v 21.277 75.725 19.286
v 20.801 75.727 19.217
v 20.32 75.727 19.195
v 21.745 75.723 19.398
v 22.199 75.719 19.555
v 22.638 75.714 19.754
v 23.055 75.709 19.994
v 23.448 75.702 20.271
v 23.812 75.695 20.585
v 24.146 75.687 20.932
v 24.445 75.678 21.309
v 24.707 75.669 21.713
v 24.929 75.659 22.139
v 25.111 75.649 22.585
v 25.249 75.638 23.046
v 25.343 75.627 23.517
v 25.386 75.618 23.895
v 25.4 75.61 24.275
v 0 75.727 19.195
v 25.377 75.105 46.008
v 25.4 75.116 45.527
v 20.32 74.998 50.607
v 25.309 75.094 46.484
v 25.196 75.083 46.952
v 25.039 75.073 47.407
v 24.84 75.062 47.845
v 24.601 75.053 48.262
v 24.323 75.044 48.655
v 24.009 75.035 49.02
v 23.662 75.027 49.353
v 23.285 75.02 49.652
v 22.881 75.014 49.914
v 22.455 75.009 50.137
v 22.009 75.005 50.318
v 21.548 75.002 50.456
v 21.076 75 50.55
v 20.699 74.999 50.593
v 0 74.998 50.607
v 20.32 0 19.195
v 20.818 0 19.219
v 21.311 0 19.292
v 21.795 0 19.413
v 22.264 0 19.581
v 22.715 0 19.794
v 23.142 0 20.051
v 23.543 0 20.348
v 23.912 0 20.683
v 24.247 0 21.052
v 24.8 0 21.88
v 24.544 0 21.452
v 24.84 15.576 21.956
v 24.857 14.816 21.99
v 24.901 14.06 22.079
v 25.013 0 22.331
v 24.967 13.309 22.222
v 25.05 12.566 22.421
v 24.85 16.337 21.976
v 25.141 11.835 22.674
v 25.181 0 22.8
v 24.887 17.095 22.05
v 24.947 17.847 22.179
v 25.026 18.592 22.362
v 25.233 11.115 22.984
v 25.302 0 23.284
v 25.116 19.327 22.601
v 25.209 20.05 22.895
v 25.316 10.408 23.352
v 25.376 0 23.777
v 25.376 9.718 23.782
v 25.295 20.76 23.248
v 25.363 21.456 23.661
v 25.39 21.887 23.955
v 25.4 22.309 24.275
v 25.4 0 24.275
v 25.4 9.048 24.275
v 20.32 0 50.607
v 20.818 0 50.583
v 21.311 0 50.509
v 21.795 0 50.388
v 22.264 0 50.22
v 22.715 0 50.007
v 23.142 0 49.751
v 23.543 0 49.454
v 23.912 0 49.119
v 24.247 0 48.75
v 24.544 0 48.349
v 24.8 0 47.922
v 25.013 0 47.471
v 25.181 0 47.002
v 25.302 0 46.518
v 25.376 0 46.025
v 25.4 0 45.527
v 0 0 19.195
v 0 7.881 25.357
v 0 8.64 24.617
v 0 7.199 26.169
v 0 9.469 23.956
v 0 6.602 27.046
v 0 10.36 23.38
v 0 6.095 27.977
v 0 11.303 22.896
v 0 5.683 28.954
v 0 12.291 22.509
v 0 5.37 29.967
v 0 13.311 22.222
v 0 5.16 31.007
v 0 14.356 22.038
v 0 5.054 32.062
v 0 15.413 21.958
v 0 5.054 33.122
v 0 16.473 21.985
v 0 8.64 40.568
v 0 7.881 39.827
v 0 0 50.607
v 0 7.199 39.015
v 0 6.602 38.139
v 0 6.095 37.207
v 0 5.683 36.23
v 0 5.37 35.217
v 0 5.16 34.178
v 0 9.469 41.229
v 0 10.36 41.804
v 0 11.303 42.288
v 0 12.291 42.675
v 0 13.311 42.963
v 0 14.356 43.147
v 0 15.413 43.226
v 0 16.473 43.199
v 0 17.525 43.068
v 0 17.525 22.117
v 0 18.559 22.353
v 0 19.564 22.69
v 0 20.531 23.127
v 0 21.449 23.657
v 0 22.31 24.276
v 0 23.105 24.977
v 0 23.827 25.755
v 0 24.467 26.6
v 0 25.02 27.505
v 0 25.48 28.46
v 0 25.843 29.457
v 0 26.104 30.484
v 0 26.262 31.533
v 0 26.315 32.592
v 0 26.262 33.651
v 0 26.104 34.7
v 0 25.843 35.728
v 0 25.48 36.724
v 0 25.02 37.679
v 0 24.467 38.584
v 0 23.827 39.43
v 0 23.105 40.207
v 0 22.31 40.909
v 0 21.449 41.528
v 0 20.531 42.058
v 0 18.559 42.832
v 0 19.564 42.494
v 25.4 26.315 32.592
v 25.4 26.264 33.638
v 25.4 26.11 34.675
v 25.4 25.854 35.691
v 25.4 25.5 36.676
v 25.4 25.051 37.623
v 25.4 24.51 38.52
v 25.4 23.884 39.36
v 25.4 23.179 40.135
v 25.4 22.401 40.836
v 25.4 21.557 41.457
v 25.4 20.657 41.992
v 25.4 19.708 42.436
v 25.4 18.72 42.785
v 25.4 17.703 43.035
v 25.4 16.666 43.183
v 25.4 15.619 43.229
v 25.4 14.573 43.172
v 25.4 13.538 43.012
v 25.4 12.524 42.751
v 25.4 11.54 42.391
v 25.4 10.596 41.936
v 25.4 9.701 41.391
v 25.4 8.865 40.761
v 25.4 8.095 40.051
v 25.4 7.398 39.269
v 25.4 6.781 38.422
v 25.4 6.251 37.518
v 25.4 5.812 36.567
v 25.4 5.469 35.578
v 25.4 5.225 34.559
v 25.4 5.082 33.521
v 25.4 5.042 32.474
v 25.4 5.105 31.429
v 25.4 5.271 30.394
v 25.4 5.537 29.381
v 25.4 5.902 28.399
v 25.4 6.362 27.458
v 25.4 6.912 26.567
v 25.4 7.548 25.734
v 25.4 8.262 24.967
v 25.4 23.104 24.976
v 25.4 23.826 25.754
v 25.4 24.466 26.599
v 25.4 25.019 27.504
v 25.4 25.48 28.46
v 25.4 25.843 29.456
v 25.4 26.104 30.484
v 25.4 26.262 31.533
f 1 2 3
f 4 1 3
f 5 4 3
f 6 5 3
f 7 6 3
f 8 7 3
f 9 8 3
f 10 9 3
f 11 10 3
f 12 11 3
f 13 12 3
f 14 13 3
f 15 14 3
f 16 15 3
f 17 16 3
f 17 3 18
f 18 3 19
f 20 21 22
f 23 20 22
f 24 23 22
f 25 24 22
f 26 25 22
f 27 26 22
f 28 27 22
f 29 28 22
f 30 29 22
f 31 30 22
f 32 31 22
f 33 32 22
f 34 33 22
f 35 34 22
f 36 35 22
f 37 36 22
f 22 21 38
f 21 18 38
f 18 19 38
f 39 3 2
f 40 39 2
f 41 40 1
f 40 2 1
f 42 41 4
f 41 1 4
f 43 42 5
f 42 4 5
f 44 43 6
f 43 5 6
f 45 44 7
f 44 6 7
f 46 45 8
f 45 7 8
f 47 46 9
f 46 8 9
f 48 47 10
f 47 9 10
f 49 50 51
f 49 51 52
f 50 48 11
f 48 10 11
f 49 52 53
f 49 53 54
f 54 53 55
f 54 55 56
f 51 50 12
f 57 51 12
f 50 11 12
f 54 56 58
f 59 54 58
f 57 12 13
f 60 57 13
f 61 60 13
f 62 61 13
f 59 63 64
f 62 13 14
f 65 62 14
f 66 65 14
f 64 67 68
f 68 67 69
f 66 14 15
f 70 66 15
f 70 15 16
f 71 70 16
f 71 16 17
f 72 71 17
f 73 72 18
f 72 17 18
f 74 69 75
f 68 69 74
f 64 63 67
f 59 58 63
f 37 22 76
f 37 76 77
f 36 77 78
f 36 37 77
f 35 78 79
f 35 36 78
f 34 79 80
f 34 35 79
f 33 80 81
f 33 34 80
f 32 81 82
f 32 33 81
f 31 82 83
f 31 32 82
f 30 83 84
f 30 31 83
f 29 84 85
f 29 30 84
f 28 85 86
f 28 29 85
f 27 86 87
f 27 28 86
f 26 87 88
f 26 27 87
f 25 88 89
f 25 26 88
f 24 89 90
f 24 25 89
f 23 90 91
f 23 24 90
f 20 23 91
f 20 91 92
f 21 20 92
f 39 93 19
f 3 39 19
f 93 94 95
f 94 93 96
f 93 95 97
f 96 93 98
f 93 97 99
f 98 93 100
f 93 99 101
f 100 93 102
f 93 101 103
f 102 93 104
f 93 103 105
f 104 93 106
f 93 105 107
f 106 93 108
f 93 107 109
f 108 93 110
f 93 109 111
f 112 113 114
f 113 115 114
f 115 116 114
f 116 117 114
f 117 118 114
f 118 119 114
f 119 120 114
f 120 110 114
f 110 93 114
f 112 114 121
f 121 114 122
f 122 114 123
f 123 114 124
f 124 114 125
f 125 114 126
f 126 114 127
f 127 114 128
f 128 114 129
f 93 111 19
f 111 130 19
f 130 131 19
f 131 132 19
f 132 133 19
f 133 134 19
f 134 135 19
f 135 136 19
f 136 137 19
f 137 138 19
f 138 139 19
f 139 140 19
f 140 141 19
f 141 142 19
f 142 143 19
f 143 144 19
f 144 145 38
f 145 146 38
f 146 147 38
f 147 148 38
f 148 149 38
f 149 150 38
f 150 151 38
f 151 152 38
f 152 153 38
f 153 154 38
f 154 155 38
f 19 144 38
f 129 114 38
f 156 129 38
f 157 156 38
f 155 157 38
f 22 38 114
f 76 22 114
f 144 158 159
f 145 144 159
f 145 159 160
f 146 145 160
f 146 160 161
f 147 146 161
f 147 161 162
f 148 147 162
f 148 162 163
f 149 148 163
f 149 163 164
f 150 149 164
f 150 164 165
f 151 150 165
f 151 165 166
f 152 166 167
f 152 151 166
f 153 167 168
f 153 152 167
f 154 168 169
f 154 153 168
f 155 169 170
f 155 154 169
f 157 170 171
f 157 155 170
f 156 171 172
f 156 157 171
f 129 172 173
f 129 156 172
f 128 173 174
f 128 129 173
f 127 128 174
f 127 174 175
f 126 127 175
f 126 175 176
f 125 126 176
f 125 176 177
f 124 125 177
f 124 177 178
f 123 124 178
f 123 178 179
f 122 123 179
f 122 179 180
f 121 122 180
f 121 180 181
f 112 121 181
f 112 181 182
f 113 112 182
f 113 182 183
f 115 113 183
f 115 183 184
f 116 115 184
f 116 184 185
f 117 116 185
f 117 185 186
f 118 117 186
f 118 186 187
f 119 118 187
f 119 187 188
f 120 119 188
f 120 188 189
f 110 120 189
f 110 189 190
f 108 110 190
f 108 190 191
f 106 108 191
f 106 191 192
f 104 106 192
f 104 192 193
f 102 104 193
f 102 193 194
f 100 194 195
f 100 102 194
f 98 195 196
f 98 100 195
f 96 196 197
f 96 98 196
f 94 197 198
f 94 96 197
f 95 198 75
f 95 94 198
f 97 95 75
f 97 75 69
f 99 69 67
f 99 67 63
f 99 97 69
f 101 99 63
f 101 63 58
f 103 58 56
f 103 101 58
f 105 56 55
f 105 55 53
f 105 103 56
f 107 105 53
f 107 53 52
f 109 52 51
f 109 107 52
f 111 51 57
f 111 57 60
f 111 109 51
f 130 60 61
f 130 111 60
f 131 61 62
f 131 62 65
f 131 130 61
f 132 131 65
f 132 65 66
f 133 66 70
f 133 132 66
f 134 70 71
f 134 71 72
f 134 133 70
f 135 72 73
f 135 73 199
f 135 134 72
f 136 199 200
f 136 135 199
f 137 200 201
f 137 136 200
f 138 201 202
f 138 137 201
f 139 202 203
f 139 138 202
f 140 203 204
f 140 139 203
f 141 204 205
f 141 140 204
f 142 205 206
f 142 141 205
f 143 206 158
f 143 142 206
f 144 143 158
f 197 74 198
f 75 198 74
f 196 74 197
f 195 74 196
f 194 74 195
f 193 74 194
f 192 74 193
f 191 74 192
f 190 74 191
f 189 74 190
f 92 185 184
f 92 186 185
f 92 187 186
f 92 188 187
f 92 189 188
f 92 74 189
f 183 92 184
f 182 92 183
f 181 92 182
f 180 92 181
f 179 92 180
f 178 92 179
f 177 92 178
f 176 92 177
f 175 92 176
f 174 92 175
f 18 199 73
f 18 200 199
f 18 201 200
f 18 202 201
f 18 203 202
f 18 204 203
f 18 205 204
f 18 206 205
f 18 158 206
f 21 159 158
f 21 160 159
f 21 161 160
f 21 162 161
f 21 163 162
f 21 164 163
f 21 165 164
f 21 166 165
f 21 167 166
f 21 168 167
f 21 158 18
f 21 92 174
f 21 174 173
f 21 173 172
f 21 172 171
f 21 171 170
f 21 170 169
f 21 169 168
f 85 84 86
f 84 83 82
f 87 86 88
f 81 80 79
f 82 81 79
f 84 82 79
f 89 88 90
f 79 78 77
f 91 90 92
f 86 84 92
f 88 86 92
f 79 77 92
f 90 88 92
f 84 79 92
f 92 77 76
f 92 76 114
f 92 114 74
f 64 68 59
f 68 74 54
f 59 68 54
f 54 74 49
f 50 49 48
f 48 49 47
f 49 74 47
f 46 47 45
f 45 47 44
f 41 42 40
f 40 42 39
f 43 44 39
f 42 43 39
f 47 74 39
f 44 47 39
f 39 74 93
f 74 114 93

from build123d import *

# Parameters (mm, degrees)
F1_R        = 10.6370455912
F2_DEPTH    = 25.4
F3_T1_DEPTH = 100.398319149
F3_T3_DEPTH = 101.1274702191


# Not quite as in the source:
# - a fillet or chamfer that OpenCascade refuses, or shapes differently, is made with other operations: its cross-section is extruded or revolved along the edge and cut away or added


with BuildPart() as f2:
    # F1 (on face) → F2 (new body)
    with BuildSketch(Plane.YZ):
        Polygon((0, 19.1946215928), (75.7274702191, 19.1946215928), (74.998319149, 50.6070703268), (0, 50.6070703268), align=None)
        with Locations((15.6783070415, 32.5921848416)):
            Circle(F1_R, mode=Mode.SUBTRACT)
    extrude(amount=F2_DEPTH)

    # F3: fillet of radius 5.08 on 2 edges, made by hand

    # F3_s2 → F3_t1 (cut)
    with BuildSketch(Plane.XZ.offset(-87.698319149)):
        with BuildLine():
            ThreePointArc((20.32, 50.6070703268), (23.9121024484, 49.1191727752), (25.4, 45.5270703268))
            Line((25.4, 45.5270703268), (25.4, 50.6070703268))
            Line((25.4, 50.6070703268), (20.32, 50.6070703268))
        make_face()
    extrude(amount=F3_T1_DEPTH, mode=Mode.SUBTRACT)

    # F3_s4 → F3_t3 (cut)
    with BuildSketch(Plane.XZ.offset(-88.4274702191)):
        with BuildLine():
            ThreePointArc((20.32, 19.1946215928), (23.9121024484, 20.6825191443), (25.4, 24.2746215928))
            Line((25.4, 24.2746215928), (25.4, 19.1946215928))
            Line((25.4, 19.1946215928), (20.32, 19.1946215928))
        make_face()
    extrude(amount=F3_T3_DEPTH, mode=Mode.SUBTRACT)


solid = f2.part
